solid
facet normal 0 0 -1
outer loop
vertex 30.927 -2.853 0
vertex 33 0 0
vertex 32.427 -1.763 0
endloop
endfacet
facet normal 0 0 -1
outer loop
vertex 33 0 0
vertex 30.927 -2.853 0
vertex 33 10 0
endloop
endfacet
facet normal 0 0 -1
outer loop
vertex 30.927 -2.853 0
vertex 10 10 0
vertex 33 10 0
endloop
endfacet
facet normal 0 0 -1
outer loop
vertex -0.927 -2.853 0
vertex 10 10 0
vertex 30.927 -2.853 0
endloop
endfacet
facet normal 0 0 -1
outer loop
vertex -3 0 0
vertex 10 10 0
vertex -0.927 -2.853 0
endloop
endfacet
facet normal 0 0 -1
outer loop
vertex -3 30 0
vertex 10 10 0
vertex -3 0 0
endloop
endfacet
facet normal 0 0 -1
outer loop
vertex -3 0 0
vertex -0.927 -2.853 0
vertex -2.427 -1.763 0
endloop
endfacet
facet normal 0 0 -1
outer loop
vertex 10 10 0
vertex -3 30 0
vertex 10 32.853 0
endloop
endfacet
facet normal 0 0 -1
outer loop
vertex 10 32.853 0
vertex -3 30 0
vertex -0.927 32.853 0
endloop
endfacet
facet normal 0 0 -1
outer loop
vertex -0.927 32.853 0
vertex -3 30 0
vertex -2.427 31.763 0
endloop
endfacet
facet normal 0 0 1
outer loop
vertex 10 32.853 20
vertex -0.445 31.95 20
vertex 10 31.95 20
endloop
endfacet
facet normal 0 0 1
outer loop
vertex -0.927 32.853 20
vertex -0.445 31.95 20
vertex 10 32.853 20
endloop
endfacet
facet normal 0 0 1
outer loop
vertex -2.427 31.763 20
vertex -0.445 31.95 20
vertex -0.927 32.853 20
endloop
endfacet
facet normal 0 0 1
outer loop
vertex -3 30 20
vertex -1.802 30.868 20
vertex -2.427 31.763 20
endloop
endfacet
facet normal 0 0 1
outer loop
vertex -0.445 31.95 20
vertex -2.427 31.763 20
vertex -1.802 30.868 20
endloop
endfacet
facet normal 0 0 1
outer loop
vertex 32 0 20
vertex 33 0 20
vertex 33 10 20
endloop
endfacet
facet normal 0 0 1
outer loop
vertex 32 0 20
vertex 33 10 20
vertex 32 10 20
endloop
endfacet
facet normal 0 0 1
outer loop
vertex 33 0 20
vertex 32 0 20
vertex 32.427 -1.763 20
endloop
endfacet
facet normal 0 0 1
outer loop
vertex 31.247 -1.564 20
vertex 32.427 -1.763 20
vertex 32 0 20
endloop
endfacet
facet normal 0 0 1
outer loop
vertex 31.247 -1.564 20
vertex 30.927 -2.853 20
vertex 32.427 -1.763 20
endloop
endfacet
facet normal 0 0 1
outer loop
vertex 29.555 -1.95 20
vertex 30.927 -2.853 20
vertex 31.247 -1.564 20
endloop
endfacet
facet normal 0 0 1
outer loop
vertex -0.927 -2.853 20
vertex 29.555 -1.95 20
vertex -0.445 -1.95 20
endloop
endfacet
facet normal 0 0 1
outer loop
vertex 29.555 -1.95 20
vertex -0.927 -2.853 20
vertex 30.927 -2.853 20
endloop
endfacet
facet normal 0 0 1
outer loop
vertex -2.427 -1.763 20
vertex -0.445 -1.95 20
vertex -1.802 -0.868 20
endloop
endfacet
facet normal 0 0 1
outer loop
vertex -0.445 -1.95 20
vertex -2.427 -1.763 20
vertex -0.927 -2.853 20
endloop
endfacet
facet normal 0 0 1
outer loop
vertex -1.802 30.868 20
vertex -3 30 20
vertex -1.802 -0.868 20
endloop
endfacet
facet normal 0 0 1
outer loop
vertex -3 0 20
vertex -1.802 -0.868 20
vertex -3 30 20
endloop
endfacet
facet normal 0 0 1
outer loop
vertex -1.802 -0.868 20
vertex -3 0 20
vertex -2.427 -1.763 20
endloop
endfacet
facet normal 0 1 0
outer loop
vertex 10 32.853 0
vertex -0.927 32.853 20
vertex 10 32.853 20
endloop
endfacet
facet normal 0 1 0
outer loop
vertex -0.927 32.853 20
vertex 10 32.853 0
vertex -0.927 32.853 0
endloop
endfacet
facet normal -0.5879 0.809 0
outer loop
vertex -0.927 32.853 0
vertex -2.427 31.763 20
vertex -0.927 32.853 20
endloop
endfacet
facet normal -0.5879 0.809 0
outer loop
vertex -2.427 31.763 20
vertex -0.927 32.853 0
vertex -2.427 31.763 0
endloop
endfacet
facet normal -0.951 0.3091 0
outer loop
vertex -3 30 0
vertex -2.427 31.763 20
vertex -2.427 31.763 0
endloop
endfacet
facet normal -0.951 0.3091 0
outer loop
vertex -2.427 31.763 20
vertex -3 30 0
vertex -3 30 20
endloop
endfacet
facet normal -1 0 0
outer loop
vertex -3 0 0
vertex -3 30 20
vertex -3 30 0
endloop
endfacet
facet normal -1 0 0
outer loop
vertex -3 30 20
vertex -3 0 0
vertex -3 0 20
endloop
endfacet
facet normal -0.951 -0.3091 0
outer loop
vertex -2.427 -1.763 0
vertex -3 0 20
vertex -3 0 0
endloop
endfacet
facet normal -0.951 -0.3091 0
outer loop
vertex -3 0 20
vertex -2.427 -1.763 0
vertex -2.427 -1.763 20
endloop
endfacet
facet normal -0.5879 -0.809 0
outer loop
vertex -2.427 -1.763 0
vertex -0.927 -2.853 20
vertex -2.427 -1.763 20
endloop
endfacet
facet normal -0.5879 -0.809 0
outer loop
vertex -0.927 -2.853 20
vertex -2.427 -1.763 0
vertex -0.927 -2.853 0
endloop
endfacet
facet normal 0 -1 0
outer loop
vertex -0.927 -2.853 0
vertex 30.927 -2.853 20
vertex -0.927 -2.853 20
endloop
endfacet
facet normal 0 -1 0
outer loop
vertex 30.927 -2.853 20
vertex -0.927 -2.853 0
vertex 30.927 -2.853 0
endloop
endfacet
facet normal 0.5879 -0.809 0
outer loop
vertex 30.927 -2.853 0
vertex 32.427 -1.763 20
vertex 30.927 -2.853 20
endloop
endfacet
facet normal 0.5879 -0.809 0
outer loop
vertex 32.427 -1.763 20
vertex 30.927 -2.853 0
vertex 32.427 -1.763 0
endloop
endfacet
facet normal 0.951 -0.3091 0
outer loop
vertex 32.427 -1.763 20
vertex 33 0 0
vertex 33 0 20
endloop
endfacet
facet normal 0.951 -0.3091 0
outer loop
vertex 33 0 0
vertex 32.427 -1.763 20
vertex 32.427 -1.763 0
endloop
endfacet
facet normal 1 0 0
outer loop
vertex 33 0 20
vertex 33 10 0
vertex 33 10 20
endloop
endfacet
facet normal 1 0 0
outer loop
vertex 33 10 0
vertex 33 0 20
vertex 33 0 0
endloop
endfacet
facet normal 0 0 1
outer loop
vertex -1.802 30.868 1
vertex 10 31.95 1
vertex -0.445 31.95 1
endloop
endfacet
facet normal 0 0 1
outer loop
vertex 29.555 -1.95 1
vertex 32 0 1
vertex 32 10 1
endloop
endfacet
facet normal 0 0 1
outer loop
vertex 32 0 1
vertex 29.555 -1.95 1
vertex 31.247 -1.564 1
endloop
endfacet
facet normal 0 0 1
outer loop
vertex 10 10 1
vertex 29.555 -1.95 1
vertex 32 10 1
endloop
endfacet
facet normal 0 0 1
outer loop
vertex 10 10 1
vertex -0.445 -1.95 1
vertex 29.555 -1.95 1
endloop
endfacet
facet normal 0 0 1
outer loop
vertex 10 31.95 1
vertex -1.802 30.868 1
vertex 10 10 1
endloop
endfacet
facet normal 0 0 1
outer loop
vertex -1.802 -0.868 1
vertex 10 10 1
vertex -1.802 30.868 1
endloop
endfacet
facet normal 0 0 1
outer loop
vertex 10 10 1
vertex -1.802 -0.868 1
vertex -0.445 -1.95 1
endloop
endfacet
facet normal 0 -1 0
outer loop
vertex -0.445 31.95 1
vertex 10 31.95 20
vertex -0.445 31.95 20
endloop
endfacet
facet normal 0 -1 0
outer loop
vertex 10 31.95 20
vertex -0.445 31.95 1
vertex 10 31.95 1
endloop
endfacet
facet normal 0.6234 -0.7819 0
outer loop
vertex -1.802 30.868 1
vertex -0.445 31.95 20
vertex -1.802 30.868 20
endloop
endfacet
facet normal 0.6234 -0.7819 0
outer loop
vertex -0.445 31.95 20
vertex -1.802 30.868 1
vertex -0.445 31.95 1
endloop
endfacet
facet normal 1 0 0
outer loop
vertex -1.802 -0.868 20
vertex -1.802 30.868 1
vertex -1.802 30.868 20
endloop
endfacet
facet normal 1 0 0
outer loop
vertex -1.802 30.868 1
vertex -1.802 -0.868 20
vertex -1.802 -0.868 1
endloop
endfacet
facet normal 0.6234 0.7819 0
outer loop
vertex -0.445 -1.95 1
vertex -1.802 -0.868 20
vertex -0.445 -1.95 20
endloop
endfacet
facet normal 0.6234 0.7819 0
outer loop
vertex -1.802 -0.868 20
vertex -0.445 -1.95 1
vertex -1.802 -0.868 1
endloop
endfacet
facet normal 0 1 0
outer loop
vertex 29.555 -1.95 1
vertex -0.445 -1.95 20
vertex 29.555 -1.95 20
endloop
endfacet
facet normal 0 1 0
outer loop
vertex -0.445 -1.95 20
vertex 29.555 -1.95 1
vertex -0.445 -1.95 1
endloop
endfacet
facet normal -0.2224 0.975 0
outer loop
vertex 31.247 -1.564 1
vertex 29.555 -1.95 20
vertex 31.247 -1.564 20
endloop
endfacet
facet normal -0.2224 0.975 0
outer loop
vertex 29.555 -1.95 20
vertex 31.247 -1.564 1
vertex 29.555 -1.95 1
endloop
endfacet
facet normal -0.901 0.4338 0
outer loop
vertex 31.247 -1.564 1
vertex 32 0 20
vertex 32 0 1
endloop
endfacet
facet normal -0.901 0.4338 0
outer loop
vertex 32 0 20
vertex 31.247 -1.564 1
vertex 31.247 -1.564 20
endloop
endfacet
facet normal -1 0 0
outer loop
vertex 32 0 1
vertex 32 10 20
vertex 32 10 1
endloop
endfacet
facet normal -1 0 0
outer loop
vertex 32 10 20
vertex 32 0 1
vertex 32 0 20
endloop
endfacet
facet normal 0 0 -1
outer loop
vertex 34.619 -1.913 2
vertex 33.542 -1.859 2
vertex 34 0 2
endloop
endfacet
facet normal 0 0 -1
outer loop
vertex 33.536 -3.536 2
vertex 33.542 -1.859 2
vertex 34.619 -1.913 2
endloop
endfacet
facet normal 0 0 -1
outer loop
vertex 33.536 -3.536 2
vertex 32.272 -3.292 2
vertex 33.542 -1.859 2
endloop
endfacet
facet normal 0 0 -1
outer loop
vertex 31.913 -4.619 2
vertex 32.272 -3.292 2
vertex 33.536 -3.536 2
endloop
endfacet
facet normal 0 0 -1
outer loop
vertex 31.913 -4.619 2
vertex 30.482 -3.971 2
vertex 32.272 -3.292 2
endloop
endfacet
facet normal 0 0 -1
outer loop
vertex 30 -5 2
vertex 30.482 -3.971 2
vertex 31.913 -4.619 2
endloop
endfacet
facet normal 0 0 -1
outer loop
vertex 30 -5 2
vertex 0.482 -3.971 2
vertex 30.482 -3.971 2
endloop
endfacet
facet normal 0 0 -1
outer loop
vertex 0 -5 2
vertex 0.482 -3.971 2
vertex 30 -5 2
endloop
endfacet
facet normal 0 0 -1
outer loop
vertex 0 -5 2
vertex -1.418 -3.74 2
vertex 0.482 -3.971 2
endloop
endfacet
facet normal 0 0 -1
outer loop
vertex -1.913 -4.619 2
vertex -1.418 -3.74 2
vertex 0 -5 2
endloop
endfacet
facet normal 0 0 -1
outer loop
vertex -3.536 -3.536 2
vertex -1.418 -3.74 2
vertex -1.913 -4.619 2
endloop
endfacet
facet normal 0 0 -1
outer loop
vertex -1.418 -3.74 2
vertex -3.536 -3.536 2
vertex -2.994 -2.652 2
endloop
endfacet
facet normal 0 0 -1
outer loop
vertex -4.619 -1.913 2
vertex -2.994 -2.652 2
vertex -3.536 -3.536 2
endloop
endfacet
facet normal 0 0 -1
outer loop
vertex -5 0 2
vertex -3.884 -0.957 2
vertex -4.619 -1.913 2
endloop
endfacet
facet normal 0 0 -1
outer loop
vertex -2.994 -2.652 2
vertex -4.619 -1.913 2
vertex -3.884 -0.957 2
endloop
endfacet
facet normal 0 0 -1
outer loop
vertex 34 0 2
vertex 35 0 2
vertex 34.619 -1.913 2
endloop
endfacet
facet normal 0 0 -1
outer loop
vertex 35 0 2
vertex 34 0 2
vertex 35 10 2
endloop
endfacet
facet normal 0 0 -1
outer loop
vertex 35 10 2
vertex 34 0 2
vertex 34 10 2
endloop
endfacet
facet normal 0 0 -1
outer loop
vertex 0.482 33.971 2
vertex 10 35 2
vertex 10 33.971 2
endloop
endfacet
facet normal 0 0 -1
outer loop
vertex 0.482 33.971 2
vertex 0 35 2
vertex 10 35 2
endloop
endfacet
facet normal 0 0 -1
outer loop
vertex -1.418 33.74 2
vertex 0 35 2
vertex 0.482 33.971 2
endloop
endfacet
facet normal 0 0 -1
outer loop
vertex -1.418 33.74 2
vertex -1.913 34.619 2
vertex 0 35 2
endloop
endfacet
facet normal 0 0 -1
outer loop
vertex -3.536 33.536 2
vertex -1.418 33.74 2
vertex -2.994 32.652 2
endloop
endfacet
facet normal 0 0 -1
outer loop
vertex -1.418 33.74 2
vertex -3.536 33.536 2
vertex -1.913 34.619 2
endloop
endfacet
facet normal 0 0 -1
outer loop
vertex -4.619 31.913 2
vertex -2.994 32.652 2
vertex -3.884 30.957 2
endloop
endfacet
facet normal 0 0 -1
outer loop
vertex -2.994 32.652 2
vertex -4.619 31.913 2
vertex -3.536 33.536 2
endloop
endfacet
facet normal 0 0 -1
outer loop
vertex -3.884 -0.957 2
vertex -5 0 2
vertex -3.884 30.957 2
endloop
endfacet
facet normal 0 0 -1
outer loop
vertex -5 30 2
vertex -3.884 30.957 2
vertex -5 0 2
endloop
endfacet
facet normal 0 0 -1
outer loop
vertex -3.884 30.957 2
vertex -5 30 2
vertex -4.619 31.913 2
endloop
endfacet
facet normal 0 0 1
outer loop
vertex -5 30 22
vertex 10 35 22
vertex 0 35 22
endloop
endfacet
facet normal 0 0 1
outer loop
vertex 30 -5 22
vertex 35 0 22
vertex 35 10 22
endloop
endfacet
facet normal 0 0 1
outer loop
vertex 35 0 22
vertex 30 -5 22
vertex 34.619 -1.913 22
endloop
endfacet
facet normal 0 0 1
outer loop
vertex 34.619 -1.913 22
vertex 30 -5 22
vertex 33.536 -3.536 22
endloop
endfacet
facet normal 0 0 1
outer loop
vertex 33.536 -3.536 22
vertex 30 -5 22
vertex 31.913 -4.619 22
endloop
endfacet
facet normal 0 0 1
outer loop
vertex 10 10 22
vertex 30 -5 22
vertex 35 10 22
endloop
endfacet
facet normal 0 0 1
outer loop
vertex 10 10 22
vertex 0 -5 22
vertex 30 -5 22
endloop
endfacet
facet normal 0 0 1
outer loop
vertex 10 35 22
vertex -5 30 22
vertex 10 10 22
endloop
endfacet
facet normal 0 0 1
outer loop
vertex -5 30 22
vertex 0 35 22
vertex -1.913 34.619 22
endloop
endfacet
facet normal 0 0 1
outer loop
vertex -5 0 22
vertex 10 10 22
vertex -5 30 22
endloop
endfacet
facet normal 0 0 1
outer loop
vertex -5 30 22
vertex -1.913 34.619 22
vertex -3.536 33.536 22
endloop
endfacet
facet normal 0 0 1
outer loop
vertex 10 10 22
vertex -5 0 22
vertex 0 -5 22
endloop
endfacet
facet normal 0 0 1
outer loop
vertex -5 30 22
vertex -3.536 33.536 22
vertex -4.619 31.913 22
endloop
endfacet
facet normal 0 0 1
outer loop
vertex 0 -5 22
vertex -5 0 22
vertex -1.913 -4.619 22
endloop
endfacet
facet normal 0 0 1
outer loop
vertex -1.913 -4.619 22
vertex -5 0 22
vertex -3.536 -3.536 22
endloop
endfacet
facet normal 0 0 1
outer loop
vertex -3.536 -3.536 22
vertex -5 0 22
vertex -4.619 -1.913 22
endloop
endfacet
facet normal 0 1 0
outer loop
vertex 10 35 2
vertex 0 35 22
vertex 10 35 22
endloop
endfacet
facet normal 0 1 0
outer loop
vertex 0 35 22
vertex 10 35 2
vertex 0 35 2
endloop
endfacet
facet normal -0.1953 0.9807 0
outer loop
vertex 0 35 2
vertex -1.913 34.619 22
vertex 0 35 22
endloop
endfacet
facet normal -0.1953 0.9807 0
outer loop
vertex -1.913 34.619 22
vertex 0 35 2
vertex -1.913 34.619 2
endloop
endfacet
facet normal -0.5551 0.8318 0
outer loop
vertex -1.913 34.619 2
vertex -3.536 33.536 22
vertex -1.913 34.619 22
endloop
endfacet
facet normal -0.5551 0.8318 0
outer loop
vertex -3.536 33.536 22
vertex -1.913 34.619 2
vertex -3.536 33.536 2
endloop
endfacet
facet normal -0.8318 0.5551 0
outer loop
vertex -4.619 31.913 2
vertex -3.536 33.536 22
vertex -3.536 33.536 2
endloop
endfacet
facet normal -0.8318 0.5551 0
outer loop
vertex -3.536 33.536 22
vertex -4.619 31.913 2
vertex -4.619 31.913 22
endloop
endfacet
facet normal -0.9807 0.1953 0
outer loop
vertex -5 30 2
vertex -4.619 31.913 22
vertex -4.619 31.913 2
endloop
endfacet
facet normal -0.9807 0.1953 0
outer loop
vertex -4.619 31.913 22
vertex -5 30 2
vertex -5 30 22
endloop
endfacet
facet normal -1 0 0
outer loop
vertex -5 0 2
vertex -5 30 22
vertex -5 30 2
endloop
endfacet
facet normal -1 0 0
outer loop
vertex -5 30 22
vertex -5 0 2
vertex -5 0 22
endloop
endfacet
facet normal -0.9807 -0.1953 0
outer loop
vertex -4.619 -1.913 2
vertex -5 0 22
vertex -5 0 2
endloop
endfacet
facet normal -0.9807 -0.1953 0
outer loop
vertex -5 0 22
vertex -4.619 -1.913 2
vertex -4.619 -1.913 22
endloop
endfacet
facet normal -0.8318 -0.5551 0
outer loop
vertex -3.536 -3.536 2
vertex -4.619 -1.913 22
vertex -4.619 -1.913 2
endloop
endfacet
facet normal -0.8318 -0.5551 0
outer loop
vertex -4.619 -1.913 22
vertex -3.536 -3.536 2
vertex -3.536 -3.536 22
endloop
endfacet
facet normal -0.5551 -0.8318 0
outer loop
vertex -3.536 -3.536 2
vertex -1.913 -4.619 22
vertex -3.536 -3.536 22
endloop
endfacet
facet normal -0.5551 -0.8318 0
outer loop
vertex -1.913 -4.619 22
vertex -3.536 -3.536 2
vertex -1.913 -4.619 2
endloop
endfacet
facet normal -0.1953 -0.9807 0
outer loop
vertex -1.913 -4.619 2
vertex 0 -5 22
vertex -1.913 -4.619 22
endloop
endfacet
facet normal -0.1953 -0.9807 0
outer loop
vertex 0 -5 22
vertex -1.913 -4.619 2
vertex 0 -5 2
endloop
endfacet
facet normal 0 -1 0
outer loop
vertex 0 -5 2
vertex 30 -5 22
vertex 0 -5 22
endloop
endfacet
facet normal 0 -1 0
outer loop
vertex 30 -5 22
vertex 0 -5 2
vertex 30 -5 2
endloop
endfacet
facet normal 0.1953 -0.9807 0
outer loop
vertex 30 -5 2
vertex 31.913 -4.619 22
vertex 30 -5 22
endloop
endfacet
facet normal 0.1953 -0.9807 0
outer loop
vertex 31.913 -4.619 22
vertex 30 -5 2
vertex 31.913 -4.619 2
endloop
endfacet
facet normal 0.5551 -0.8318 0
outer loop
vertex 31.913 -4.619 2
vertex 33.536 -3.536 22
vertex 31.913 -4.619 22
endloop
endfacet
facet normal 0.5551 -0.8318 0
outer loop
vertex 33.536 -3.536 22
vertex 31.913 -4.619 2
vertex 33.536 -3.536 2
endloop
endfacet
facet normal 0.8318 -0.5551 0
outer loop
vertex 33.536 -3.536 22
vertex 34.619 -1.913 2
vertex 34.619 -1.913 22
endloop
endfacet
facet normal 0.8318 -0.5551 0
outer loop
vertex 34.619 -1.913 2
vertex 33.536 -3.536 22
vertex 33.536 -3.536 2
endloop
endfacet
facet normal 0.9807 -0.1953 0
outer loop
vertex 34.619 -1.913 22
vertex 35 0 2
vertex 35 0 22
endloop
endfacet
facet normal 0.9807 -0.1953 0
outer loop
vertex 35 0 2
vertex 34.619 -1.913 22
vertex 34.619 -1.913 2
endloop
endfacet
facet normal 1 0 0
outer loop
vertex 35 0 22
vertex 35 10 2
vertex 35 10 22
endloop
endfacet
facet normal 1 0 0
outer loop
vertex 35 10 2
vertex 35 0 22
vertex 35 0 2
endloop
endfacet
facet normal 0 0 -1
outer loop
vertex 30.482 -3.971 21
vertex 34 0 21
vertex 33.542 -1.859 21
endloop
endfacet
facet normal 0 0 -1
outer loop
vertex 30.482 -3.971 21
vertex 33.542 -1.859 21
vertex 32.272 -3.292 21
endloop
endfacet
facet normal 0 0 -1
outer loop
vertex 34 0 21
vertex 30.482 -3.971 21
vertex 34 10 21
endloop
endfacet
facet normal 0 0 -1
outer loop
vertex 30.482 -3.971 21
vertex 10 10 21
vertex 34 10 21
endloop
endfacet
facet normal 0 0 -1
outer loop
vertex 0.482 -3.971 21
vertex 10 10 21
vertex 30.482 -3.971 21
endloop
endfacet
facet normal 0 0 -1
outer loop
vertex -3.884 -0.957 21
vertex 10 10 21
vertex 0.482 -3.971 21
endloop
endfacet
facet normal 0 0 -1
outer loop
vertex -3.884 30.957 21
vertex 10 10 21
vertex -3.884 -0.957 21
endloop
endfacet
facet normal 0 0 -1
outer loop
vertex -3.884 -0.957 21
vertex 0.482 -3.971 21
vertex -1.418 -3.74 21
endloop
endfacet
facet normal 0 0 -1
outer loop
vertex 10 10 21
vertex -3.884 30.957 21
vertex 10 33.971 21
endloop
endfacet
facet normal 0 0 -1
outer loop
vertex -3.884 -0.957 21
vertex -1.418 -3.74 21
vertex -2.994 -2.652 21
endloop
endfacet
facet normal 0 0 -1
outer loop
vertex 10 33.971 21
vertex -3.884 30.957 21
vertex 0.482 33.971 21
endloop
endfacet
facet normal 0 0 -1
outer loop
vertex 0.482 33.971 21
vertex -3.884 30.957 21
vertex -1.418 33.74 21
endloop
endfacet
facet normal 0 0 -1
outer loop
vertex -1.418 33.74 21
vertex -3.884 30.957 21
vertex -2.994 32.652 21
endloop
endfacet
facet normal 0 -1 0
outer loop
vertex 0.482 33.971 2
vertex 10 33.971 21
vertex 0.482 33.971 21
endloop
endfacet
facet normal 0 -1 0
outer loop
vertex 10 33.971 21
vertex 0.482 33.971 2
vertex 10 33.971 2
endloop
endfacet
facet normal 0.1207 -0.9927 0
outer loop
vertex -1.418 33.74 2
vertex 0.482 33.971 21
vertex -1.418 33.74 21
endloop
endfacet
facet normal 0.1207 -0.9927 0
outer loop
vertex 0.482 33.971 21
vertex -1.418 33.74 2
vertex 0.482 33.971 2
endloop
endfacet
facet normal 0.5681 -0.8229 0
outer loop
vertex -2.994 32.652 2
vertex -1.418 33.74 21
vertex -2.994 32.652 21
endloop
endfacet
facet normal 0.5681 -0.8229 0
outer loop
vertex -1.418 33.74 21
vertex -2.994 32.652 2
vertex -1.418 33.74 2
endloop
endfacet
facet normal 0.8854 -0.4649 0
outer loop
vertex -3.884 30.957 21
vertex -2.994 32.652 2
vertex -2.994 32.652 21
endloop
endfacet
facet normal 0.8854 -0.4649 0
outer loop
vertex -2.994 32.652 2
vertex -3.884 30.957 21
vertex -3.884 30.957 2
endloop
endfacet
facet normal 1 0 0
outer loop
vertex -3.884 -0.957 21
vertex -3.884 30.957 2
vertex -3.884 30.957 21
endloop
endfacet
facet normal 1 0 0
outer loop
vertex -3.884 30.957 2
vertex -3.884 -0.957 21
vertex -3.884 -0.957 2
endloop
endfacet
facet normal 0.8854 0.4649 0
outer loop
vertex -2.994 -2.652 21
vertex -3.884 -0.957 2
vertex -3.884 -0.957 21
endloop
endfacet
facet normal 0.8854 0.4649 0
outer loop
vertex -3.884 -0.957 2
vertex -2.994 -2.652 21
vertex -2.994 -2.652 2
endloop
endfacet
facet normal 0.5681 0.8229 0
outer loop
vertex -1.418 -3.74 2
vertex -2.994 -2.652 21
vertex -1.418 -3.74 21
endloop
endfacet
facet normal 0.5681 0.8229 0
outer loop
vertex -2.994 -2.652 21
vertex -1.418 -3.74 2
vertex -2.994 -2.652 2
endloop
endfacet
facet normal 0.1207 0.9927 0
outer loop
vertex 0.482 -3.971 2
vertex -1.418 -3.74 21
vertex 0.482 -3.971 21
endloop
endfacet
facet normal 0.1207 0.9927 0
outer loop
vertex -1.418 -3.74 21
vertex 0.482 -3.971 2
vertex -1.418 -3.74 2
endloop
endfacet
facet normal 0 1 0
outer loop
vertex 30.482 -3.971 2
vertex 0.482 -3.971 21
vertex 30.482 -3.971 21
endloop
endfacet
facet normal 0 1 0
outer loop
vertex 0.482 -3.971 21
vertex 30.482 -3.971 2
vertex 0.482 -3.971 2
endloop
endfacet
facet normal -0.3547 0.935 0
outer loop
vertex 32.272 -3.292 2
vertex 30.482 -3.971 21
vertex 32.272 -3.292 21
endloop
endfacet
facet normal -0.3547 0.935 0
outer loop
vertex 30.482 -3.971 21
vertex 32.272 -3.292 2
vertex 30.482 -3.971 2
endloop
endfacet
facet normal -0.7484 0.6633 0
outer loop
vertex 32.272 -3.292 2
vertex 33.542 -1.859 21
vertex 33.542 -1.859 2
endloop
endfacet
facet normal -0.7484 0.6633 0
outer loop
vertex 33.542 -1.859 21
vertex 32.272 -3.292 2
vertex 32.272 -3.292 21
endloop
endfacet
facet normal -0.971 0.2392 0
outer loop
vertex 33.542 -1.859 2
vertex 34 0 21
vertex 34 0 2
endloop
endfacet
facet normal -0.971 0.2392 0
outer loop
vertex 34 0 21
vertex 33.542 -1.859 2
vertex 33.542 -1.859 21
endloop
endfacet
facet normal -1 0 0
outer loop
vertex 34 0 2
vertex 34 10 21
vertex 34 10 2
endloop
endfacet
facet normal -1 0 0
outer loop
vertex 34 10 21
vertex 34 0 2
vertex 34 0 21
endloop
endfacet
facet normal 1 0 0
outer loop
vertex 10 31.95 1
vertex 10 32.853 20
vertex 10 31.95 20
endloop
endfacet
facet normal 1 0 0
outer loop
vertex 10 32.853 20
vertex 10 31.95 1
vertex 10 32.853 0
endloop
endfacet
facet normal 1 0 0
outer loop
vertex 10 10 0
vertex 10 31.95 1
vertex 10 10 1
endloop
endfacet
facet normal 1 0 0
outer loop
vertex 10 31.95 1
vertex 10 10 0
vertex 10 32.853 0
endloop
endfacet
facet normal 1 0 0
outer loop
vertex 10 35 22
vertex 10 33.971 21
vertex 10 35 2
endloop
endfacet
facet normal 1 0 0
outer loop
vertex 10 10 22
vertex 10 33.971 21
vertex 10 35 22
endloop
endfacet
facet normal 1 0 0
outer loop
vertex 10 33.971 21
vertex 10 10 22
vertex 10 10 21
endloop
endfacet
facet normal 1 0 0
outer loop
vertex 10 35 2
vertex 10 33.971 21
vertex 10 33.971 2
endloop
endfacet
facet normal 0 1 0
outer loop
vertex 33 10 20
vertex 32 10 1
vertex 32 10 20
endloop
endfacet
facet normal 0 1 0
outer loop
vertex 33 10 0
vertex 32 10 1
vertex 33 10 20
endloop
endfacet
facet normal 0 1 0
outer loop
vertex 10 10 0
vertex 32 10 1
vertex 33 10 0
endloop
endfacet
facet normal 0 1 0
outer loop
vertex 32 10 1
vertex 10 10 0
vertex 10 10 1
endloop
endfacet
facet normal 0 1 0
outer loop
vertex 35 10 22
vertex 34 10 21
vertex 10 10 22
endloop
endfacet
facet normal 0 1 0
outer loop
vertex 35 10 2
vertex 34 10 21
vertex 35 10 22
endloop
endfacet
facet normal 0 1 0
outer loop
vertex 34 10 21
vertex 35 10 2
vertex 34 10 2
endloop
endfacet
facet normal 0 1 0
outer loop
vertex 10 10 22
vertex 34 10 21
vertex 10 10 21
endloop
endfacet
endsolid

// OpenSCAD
data=[[0,0],[0,30],[18,30],
      [18,15],[30,15],[30,0]];

difference(){
    assembly();
    translate([10,10,-10]){
        cube([100,100,100]);
    };
};

module assembly(){
    box(3,1);
    translate([0,0,2]){
        box(5,-1);
    };
};

module box(r,h){
    difference(){
        linear_extrude(20){
            shape(r);
        };
        translate([0,0,h]){
            linear_extrude(20){
                shape(r-1);
            };
        };
    };
};
module shape(r){
    minkowski(){
        polygon(data);
        circle(r);
    };
};
